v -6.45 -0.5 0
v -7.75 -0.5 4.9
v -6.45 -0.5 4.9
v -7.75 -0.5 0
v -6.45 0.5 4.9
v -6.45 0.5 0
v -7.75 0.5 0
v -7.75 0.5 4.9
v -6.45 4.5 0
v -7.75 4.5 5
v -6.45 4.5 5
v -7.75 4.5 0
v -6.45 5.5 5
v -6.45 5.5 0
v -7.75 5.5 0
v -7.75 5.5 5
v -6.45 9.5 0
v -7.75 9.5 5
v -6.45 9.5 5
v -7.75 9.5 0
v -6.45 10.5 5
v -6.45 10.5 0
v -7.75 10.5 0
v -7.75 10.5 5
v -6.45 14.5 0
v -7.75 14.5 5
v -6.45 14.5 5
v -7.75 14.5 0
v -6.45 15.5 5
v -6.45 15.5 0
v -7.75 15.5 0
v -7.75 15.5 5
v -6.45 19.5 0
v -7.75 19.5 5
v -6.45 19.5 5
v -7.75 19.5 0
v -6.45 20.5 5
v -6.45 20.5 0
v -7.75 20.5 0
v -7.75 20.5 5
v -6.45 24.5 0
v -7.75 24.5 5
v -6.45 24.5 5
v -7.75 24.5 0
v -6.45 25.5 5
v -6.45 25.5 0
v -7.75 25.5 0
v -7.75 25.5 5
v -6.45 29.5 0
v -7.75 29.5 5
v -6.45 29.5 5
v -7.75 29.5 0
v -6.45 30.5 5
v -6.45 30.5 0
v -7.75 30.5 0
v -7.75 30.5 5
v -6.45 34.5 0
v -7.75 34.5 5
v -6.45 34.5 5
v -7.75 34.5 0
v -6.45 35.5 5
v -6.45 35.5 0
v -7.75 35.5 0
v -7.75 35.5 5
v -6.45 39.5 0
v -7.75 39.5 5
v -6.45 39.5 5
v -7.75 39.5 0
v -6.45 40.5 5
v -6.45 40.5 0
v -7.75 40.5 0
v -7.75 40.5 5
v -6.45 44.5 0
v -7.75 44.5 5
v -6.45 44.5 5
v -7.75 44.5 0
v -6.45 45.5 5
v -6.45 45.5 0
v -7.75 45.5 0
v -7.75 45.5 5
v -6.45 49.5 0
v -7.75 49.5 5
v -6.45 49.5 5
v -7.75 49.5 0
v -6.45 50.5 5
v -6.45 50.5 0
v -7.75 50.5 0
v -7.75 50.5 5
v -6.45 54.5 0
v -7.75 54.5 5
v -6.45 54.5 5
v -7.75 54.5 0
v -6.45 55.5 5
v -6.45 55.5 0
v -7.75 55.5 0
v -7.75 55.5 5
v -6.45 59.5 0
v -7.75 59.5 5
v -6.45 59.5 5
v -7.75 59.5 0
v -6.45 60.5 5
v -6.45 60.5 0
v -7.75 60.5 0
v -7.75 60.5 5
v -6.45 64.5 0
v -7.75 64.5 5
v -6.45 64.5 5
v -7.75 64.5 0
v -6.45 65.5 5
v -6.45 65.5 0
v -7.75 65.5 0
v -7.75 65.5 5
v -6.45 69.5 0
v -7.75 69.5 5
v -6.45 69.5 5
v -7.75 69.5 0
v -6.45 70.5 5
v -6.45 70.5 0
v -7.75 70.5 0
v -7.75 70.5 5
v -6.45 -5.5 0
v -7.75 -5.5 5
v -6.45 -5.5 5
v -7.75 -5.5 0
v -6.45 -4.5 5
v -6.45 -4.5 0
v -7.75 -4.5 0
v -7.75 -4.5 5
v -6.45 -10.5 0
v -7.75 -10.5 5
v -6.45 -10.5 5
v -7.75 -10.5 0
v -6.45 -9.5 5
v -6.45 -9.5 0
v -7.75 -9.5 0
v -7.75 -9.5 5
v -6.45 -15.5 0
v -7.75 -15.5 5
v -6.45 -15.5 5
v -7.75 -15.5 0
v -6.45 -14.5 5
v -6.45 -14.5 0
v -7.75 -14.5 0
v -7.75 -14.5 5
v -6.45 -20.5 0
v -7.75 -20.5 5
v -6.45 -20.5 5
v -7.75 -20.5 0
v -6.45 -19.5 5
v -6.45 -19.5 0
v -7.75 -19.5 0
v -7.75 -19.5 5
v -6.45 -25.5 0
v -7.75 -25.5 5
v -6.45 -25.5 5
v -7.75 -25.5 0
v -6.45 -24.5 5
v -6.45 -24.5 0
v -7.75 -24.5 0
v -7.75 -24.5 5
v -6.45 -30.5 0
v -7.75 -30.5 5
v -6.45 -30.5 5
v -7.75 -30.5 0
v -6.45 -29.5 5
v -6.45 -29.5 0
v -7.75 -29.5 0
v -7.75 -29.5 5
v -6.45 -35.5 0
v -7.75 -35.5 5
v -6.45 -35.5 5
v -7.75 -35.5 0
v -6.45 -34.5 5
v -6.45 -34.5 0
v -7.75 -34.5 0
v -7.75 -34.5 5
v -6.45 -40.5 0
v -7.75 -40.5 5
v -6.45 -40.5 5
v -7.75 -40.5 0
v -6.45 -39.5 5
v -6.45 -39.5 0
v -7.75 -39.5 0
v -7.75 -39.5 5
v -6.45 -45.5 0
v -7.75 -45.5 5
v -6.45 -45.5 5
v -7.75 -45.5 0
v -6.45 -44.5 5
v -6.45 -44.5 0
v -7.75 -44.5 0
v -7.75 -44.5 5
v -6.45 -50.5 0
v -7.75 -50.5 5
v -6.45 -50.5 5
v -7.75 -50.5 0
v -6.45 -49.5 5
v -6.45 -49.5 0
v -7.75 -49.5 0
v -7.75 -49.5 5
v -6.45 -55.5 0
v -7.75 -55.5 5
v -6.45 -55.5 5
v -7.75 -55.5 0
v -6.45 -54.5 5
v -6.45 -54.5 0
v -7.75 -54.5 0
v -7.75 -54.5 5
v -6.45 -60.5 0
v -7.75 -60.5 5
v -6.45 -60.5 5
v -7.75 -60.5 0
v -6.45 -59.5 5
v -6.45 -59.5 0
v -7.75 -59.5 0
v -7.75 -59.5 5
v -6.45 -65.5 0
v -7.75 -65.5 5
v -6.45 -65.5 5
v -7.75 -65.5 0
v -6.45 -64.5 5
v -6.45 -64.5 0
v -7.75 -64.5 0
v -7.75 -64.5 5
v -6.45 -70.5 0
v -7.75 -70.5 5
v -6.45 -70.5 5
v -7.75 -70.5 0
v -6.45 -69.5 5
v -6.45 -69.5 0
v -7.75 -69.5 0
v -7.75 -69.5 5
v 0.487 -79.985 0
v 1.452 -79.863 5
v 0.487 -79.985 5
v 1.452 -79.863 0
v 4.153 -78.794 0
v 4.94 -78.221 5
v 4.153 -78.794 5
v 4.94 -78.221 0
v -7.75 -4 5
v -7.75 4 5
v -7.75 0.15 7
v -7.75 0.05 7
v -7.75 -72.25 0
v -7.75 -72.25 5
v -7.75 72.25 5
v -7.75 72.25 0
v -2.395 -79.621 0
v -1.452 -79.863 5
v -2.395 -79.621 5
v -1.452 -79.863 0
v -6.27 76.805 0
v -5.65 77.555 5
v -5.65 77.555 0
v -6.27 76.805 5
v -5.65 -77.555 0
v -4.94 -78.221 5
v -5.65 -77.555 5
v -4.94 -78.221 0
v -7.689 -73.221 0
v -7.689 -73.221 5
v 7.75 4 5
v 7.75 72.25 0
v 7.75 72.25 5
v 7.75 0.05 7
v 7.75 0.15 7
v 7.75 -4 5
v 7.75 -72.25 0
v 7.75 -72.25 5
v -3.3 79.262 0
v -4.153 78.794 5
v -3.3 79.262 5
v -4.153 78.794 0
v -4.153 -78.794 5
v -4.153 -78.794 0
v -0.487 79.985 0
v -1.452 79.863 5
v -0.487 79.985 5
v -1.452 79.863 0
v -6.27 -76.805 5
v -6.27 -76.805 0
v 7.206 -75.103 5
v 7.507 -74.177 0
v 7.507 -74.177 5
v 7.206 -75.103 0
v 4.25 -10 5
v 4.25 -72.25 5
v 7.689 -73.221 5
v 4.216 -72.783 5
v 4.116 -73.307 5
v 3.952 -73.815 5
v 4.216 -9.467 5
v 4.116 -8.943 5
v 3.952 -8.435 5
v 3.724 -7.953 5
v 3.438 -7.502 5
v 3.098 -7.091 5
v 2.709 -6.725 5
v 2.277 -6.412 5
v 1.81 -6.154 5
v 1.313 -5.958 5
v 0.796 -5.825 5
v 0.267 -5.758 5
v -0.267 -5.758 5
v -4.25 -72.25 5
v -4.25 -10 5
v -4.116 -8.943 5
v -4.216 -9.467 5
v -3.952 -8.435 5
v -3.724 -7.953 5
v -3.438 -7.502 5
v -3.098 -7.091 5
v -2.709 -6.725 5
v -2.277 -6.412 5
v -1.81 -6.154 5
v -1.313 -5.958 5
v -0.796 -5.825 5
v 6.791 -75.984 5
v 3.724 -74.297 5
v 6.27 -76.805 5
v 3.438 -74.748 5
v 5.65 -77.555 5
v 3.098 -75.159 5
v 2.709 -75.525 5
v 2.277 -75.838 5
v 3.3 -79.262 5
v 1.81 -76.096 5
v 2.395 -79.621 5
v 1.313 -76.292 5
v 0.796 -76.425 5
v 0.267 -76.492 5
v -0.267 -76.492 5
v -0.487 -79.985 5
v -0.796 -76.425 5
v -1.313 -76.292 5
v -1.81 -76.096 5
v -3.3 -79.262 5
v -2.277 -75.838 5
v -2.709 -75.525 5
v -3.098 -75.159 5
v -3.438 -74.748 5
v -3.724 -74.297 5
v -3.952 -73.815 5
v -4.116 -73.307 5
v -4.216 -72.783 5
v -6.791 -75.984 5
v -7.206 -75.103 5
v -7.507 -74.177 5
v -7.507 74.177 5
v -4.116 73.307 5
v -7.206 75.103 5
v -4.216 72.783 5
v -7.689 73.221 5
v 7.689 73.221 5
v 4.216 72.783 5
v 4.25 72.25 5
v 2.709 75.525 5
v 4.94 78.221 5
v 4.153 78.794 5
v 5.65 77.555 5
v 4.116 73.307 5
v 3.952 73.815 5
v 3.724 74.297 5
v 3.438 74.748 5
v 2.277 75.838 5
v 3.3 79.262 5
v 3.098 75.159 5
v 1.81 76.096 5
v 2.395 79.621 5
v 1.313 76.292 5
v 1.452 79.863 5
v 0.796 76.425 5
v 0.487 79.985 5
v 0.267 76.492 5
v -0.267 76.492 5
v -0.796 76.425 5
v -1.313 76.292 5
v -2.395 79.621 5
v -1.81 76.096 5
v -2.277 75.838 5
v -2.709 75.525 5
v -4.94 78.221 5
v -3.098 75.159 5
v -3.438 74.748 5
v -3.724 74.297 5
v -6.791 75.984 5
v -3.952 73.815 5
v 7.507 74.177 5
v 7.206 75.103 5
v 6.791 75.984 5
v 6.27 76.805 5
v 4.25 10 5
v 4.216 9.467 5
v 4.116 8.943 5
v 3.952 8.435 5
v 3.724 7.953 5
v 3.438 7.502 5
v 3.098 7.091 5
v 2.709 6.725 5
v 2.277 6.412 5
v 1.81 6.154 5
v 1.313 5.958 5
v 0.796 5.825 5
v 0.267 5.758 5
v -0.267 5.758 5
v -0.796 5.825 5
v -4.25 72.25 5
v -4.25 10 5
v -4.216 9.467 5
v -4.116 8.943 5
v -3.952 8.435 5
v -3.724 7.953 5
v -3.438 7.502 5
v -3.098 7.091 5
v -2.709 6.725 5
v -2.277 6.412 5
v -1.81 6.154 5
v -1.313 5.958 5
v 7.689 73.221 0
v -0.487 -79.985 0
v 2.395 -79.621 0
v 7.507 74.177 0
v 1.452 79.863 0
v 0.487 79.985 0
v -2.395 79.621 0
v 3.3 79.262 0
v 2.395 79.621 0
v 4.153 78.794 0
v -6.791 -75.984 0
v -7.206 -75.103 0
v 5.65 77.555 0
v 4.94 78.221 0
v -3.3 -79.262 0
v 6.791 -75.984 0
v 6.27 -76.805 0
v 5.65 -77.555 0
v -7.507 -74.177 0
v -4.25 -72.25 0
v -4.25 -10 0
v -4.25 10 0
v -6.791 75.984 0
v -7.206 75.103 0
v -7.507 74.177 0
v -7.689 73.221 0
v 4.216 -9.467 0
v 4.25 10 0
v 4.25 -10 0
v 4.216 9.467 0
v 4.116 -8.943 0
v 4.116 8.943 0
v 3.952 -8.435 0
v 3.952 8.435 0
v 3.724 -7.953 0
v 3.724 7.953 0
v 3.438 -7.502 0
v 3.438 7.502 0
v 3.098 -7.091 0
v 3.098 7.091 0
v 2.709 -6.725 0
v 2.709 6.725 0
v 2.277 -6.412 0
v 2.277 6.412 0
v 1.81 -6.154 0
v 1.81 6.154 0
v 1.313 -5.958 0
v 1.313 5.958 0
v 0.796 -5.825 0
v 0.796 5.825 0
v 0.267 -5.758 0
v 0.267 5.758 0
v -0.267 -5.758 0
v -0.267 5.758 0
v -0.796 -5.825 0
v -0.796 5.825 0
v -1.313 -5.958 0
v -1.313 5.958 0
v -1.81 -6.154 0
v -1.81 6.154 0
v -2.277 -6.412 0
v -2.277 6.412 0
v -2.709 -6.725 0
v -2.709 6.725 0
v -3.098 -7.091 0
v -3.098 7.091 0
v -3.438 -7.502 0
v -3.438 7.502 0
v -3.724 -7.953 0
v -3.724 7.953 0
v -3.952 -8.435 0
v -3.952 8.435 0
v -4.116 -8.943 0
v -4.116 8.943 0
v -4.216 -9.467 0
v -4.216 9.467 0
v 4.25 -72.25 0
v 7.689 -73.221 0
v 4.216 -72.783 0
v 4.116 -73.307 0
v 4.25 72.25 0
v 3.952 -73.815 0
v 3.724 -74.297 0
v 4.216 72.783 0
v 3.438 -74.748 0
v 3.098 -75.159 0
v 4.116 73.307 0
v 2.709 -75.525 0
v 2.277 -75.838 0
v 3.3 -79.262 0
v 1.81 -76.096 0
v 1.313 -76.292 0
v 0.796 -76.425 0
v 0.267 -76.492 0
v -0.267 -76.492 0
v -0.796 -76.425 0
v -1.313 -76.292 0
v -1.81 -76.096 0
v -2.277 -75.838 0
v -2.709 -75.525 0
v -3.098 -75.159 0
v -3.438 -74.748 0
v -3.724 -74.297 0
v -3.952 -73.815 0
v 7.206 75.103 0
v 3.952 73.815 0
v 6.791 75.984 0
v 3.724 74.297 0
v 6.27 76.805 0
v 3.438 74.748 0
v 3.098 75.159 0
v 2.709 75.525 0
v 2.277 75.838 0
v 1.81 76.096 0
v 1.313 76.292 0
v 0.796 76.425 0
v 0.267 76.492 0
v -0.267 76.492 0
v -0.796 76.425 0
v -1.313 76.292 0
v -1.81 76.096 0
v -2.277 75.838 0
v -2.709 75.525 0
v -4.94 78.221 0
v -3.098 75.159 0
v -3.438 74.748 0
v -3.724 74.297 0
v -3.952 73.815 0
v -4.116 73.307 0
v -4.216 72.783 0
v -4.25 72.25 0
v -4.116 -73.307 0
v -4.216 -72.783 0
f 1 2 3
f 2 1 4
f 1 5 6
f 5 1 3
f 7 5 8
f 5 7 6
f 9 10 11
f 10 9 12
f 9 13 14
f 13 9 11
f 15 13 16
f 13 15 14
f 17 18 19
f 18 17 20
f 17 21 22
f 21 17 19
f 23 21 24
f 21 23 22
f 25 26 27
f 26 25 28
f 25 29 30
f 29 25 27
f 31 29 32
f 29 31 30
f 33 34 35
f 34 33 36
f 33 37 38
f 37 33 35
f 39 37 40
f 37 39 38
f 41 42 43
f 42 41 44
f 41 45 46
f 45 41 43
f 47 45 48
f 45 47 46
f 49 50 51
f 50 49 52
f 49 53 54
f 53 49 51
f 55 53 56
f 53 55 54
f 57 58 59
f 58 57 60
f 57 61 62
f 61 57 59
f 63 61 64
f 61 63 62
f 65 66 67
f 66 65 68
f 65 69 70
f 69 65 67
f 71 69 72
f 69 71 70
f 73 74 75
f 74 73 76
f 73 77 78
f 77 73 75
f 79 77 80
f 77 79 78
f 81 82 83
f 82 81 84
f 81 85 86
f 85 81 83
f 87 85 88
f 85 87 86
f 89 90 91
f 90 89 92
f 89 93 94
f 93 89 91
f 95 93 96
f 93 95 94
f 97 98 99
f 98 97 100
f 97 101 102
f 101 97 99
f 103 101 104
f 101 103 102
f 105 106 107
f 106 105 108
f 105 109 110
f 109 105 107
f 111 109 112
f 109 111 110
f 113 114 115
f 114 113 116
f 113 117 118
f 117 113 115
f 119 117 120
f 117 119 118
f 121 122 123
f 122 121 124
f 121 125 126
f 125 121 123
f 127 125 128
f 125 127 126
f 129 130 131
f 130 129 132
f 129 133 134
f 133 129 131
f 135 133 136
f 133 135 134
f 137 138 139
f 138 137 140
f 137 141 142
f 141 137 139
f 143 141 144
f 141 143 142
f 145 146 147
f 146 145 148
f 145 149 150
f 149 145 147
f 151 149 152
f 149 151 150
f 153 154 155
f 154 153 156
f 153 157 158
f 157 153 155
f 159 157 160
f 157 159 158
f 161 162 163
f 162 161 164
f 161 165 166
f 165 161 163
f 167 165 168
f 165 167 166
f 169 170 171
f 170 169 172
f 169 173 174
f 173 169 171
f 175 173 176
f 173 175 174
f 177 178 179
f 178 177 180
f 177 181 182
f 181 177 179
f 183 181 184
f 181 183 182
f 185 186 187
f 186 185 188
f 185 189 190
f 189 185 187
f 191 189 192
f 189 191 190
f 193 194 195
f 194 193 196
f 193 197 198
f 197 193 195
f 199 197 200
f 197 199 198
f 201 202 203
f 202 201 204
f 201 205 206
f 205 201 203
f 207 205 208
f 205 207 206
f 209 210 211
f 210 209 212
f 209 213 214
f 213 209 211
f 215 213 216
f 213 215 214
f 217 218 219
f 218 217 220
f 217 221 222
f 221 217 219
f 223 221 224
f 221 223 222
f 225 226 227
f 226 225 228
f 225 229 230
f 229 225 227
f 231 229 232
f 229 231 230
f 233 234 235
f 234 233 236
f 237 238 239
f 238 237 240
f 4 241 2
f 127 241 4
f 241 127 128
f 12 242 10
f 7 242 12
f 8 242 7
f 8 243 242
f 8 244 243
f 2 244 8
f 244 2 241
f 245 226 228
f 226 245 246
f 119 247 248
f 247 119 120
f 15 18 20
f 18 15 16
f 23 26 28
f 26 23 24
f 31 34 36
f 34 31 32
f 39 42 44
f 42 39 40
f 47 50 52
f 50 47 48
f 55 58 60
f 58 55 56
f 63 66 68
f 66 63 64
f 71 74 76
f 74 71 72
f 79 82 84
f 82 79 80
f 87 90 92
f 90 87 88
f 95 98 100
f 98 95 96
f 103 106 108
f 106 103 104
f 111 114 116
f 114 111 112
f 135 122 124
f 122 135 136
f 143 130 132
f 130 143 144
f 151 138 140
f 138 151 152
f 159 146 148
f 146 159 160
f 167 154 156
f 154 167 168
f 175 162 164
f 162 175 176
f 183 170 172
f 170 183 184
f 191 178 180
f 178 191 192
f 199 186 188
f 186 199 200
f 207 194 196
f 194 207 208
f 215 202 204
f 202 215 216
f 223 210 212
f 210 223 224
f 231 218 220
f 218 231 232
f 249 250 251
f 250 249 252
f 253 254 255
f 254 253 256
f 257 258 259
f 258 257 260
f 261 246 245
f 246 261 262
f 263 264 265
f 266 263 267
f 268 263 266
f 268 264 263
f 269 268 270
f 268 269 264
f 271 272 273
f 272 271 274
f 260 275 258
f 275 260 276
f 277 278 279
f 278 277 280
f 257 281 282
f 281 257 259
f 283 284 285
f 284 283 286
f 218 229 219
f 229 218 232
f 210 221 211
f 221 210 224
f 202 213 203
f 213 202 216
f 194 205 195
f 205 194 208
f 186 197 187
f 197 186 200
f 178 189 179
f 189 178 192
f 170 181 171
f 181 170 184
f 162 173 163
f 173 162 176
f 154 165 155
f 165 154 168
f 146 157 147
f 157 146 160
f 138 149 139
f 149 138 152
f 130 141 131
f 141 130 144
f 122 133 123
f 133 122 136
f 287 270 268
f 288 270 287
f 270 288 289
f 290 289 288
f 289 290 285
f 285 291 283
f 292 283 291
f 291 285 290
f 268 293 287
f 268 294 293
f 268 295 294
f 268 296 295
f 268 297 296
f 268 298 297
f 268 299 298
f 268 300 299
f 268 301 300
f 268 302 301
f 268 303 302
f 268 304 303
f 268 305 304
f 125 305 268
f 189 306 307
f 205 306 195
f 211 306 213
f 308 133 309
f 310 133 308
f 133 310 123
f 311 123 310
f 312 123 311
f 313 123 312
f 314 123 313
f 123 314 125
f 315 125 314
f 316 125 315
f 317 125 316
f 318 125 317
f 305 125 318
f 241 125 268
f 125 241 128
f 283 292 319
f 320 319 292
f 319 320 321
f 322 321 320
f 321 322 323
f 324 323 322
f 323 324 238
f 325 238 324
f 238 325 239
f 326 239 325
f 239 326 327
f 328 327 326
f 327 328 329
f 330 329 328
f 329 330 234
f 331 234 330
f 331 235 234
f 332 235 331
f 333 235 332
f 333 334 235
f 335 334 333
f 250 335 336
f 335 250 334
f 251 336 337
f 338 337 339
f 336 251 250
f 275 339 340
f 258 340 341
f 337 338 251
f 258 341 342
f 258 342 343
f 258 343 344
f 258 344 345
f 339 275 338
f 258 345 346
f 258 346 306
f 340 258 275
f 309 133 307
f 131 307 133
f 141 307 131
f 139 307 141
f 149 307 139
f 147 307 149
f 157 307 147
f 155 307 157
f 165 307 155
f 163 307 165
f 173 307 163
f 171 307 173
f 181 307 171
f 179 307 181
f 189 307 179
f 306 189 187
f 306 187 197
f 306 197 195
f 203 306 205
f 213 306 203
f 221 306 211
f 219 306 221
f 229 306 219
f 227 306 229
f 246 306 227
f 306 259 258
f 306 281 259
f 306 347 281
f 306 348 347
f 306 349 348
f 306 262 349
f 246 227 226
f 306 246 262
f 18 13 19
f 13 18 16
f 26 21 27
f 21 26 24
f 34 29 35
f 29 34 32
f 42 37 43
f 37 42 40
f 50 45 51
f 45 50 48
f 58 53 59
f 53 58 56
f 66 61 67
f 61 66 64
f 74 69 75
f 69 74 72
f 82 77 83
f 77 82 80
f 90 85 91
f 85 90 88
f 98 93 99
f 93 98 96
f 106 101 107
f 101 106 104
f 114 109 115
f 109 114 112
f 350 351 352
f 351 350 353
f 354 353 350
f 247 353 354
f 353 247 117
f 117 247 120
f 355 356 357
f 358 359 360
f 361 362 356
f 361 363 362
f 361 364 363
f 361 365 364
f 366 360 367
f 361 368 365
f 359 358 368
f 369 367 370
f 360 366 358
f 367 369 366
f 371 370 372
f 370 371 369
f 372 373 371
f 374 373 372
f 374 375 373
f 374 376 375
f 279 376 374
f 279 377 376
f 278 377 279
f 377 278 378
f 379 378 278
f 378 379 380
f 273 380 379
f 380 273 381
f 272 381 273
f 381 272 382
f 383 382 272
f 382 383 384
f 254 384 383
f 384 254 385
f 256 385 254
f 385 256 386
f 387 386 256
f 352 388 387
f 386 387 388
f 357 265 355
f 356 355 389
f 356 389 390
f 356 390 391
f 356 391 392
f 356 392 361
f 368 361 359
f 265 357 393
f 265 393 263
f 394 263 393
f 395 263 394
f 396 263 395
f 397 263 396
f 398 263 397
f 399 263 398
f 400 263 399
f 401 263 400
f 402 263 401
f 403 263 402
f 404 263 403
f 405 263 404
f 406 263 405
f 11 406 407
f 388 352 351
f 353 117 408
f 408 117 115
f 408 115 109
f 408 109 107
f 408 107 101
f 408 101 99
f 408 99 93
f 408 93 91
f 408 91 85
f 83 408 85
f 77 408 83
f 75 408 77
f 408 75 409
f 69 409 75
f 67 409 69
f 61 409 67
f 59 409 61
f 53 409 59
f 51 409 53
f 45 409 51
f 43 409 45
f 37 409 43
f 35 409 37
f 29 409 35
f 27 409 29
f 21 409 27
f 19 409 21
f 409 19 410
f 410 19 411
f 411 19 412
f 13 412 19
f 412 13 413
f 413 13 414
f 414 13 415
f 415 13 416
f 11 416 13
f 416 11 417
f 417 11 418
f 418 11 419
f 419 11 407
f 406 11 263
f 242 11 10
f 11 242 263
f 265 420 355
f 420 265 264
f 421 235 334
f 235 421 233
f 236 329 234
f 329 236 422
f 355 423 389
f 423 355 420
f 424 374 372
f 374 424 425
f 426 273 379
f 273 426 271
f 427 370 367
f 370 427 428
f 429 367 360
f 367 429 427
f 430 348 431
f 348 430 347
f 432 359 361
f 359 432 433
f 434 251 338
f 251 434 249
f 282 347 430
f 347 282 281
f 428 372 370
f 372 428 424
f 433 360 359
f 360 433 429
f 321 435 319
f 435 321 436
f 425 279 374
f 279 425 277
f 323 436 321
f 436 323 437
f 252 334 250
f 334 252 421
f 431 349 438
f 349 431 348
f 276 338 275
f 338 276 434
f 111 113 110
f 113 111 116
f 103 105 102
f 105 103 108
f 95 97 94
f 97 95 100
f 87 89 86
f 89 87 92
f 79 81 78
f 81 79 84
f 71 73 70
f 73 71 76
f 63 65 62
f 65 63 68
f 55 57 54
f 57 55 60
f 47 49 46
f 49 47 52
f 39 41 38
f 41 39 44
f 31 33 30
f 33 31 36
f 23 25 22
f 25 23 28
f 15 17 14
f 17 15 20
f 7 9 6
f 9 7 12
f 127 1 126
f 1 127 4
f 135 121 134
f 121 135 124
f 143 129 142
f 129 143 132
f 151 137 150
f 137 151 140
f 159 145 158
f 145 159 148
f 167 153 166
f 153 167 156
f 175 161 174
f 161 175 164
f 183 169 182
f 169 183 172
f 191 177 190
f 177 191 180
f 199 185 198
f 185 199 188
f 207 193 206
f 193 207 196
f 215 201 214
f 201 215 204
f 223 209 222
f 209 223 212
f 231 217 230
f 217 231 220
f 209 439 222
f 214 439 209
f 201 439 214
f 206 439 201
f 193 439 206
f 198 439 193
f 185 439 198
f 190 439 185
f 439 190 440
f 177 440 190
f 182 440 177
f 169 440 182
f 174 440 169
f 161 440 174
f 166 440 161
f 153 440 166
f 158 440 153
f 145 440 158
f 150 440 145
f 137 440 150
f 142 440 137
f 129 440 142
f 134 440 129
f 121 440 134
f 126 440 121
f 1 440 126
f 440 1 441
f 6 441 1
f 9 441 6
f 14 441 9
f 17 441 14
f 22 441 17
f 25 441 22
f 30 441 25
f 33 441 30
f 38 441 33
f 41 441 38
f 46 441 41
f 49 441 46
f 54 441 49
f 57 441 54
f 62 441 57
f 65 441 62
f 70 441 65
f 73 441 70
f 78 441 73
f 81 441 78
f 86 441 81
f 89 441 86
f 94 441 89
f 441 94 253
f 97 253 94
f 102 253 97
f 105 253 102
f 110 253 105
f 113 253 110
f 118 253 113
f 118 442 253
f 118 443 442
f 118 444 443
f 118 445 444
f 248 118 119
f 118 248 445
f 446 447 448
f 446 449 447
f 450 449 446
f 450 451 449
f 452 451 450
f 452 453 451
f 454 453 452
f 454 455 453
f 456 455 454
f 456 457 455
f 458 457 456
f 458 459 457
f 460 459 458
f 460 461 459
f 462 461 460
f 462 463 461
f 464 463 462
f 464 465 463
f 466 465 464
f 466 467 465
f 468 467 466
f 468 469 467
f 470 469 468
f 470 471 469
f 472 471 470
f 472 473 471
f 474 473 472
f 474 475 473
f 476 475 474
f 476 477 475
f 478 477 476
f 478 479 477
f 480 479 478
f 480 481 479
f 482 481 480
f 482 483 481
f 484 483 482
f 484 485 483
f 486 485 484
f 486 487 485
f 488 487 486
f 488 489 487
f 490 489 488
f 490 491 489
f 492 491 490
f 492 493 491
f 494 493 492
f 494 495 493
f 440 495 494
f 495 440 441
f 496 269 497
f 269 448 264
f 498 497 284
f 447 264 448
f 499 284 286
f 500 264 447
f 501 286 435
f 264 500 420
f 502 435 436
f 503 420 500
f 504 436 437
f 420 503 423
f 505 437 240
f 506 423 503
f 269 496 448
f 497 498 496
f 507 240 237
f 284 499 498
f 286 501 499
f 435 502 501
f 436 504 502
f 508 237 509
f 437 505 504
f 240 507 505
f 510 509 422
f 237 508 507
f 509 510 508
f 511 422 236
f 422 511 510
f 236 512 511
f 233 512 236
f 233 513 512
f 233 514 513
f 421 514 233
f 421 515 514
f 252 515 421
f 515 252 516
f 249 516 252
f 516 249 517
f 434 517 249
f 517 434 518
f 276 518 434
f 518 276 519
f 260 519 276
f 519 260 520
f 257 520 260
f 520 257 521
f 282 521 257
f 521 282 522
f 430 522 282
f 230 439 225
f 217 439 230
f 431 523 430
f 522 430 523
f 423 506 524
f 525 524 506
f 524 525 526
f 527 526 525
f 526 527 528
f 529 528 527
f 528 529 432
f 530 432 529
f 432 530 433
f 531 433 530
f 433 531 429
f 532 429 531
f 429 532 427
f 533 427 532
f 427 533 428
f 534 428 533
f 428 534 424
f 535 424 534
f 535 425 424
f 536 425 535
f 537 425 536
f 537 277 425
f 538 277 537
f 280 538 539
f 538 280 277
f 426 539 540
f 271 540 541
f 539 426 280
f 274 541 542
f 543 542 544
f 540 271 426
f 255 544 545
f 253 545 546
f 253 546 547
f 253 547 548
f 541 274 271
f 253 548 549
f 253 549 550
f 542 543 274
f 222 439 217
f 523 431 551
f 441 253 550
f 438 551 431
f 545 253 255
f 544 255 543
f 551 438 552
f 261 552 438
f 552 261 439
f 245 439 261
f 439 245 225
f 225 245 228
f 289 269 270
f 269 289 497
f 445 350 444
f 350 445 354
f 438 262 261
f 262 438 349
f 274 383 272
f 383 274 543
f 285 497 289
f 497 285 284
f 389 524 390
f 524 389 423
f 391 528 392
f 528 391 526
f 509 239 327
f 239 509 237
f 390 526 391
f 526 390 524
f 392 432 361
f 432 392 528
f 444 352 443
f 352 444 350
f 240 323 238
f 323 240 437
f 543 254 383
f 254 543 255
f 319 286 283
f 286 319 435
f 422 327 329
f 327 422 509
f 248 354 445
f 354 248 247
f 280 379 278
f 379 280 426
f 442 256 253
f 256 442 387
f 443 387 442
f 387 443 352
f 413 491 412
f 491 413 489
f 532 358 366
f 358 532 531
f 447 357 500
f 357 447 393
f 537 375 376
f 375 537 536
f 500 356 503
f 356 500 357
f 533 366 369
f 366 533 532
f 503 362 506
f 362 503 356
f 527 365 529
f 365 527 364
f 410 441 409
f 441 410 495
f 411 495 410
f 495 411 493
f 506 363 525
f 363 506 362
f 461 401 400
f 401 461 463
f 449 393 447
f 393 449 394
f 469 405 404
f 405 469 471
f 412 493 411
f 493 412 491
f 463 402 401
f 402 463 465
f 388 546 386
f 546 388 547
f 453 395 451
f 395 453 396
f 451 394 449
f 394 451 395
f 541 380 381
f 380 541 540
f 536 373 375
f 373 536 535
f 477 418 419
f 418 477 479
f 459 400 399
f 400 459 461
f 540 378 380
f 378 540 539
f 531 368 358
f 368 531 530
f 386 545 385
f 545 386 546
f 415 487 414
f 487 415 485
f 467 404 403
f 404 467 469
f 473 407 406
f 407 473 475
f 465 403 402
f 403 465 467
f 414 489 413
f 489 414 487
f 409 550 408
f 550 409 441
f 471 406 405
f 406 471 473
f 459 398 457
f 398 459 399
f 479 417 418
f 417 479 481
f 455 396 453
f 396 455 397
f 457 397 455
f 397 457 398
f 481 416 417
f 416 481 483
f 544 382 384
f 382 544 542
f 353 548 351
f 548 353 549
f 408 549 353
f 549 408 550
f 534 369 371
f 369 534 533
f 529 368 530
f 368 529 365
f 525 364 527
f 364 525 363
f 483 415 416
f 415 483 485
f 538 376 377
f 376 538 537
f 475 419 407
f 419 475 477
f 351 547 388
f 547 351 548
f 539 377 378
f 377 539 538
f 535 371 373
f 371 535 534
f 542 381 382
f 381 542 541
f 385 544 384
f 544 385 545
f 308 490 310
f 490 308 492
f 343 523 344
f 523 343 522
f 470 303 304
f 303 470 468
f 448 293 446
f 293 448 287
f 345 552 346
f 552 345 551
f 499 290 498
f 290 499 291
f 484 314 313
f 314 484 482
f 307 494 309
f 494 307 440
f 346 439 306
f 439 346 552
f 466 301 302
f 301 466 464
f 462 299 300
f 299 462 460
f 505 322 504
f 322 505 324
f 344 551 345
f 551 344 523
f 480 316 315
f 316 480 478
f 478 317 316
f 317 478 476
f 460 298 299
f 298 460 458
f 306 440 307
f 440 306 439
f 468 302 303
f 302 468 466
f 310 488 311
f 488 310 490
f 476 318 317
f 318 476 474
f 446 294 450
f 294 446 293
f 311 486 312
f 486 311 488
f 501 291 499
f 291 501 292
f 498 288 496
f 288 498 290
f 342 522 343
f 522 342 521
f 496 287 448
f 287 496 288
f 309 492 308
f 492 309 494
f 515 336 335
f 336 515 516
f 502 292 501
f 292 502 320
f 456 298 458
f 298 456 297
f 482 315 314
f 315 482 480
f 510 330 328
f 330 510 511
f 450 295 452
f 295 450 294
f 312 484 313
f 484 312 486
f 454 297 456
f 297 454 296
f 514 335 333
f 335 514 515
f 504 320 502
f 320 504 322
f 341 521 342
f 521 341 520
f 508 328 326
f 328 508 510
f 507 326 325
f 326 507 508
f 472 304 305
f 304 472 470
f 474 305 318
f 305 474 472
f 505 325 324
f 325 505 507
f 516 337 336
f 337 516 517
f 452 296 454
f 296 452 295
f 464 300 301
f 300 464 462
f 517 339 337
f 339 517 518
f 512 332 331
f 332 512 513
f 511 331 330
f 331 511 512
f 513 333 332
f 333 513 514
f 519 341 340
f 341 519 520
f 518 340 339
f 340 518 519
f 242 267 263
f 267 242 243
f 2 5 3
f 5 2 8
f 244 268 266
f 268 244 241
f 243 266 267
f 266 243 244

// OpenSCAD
// Length of the cutting guide
length = 160;
// Inner cutout for the screws
inner = 8.5;
// Thickness of the walls
walls = 3.5;
// Height of the cutting guide
height = 5;

/* [Guide] */
// Enable guide
guide = "enabled"; // [enabled: Enabled, disabled: Disabled]
// Width of the triangular guide
guideWidth = 8;
// Height of the triangular guide
guideHeight = 2;

/* [Ruler] */
ruler = "enabled"; // [enabled: Enabled, disabled: Disabled]
// Depth of the intendation
indentationDepth = 1.2;
// Inner width of intendation
indentationInner = 1;
// Outer width of intendation
indentationOuter = 1;
// Space between intendations
steps = 5;

/* [Hidden] */
$fn = 50;
innerRadius = inner / 2;
outerRadius = innerRadius + walls;
offsetY = guideWidth / 2 + walls;
offsetY = innerRadius + guideWidth / 2 + walls / 2;

difference() {
    hull() {
        translate([0, length / 2 - outerRadius, 0])
            cylinder(r = outerRadius, h = height);

        translate([0, -length / 2 + outerRadius, 0])
            cylinder(r = outerRadius, h = height);
    }

    hull() {
        translate([0, length / 2 - innerRadius - walls, -1])
            cylinder(r = innerRadius, h = height + 2);

        translate([0, offsetY, -1])
            cylinder(r = innerRadius, h = height + 2);
    }
    
    hull() {
        translate([0, -offsetY, -1])
            cylinder(r = innerRadius, h = height + 2);

        translate([0, -length / 2 + outerRadius, -1])
            cylinder(r = innerRadius, h = height + 2);
    }
    
    if(ruler == "enabled") {
        for(i=[0:1:(length / 2 / steps - outerRadius / steps)]) {
            hull() {
                translate([-outerRadius + indentationDepth, steps * i - indentationInner / 2, -1])
                    cube([0.1, indentationInner, height + 2]);
            
                translate([-(outerRadius + indentationDepth), steps * i - indentationOuter / 2, -1])
                    cube([0.1, indentationOuter, height + 2]);
            }
        }

        for(i=[0:-1:-(length / 2 / steps - outerRadius / steps)]) {
            hull() {
                translate([-outerRadius + indentationDepth, steps * i - indentationInner / 2, -1])
                    cube([0.1, indentationInner, height + 2]);
            
                translate([-(outerRadius + indentationDepth), steps * i - indentationOuter / 2, -1])
                    cube([0.1, indentationOuter, height + 2]);
            }
        }
    }
}

if(guide == "enabled") {
    hull() {
        translate([-outerRadius, -guideWidth / 2, height - 0.1])
            cube([outerRadius * 2, guideWidth, 0.1]);
        
        translate([-outerRadius, 0.05, height + guideHeight - 0.1])
            cube([outerRadius * 2, 0.1, 0.1]);
    }
}
